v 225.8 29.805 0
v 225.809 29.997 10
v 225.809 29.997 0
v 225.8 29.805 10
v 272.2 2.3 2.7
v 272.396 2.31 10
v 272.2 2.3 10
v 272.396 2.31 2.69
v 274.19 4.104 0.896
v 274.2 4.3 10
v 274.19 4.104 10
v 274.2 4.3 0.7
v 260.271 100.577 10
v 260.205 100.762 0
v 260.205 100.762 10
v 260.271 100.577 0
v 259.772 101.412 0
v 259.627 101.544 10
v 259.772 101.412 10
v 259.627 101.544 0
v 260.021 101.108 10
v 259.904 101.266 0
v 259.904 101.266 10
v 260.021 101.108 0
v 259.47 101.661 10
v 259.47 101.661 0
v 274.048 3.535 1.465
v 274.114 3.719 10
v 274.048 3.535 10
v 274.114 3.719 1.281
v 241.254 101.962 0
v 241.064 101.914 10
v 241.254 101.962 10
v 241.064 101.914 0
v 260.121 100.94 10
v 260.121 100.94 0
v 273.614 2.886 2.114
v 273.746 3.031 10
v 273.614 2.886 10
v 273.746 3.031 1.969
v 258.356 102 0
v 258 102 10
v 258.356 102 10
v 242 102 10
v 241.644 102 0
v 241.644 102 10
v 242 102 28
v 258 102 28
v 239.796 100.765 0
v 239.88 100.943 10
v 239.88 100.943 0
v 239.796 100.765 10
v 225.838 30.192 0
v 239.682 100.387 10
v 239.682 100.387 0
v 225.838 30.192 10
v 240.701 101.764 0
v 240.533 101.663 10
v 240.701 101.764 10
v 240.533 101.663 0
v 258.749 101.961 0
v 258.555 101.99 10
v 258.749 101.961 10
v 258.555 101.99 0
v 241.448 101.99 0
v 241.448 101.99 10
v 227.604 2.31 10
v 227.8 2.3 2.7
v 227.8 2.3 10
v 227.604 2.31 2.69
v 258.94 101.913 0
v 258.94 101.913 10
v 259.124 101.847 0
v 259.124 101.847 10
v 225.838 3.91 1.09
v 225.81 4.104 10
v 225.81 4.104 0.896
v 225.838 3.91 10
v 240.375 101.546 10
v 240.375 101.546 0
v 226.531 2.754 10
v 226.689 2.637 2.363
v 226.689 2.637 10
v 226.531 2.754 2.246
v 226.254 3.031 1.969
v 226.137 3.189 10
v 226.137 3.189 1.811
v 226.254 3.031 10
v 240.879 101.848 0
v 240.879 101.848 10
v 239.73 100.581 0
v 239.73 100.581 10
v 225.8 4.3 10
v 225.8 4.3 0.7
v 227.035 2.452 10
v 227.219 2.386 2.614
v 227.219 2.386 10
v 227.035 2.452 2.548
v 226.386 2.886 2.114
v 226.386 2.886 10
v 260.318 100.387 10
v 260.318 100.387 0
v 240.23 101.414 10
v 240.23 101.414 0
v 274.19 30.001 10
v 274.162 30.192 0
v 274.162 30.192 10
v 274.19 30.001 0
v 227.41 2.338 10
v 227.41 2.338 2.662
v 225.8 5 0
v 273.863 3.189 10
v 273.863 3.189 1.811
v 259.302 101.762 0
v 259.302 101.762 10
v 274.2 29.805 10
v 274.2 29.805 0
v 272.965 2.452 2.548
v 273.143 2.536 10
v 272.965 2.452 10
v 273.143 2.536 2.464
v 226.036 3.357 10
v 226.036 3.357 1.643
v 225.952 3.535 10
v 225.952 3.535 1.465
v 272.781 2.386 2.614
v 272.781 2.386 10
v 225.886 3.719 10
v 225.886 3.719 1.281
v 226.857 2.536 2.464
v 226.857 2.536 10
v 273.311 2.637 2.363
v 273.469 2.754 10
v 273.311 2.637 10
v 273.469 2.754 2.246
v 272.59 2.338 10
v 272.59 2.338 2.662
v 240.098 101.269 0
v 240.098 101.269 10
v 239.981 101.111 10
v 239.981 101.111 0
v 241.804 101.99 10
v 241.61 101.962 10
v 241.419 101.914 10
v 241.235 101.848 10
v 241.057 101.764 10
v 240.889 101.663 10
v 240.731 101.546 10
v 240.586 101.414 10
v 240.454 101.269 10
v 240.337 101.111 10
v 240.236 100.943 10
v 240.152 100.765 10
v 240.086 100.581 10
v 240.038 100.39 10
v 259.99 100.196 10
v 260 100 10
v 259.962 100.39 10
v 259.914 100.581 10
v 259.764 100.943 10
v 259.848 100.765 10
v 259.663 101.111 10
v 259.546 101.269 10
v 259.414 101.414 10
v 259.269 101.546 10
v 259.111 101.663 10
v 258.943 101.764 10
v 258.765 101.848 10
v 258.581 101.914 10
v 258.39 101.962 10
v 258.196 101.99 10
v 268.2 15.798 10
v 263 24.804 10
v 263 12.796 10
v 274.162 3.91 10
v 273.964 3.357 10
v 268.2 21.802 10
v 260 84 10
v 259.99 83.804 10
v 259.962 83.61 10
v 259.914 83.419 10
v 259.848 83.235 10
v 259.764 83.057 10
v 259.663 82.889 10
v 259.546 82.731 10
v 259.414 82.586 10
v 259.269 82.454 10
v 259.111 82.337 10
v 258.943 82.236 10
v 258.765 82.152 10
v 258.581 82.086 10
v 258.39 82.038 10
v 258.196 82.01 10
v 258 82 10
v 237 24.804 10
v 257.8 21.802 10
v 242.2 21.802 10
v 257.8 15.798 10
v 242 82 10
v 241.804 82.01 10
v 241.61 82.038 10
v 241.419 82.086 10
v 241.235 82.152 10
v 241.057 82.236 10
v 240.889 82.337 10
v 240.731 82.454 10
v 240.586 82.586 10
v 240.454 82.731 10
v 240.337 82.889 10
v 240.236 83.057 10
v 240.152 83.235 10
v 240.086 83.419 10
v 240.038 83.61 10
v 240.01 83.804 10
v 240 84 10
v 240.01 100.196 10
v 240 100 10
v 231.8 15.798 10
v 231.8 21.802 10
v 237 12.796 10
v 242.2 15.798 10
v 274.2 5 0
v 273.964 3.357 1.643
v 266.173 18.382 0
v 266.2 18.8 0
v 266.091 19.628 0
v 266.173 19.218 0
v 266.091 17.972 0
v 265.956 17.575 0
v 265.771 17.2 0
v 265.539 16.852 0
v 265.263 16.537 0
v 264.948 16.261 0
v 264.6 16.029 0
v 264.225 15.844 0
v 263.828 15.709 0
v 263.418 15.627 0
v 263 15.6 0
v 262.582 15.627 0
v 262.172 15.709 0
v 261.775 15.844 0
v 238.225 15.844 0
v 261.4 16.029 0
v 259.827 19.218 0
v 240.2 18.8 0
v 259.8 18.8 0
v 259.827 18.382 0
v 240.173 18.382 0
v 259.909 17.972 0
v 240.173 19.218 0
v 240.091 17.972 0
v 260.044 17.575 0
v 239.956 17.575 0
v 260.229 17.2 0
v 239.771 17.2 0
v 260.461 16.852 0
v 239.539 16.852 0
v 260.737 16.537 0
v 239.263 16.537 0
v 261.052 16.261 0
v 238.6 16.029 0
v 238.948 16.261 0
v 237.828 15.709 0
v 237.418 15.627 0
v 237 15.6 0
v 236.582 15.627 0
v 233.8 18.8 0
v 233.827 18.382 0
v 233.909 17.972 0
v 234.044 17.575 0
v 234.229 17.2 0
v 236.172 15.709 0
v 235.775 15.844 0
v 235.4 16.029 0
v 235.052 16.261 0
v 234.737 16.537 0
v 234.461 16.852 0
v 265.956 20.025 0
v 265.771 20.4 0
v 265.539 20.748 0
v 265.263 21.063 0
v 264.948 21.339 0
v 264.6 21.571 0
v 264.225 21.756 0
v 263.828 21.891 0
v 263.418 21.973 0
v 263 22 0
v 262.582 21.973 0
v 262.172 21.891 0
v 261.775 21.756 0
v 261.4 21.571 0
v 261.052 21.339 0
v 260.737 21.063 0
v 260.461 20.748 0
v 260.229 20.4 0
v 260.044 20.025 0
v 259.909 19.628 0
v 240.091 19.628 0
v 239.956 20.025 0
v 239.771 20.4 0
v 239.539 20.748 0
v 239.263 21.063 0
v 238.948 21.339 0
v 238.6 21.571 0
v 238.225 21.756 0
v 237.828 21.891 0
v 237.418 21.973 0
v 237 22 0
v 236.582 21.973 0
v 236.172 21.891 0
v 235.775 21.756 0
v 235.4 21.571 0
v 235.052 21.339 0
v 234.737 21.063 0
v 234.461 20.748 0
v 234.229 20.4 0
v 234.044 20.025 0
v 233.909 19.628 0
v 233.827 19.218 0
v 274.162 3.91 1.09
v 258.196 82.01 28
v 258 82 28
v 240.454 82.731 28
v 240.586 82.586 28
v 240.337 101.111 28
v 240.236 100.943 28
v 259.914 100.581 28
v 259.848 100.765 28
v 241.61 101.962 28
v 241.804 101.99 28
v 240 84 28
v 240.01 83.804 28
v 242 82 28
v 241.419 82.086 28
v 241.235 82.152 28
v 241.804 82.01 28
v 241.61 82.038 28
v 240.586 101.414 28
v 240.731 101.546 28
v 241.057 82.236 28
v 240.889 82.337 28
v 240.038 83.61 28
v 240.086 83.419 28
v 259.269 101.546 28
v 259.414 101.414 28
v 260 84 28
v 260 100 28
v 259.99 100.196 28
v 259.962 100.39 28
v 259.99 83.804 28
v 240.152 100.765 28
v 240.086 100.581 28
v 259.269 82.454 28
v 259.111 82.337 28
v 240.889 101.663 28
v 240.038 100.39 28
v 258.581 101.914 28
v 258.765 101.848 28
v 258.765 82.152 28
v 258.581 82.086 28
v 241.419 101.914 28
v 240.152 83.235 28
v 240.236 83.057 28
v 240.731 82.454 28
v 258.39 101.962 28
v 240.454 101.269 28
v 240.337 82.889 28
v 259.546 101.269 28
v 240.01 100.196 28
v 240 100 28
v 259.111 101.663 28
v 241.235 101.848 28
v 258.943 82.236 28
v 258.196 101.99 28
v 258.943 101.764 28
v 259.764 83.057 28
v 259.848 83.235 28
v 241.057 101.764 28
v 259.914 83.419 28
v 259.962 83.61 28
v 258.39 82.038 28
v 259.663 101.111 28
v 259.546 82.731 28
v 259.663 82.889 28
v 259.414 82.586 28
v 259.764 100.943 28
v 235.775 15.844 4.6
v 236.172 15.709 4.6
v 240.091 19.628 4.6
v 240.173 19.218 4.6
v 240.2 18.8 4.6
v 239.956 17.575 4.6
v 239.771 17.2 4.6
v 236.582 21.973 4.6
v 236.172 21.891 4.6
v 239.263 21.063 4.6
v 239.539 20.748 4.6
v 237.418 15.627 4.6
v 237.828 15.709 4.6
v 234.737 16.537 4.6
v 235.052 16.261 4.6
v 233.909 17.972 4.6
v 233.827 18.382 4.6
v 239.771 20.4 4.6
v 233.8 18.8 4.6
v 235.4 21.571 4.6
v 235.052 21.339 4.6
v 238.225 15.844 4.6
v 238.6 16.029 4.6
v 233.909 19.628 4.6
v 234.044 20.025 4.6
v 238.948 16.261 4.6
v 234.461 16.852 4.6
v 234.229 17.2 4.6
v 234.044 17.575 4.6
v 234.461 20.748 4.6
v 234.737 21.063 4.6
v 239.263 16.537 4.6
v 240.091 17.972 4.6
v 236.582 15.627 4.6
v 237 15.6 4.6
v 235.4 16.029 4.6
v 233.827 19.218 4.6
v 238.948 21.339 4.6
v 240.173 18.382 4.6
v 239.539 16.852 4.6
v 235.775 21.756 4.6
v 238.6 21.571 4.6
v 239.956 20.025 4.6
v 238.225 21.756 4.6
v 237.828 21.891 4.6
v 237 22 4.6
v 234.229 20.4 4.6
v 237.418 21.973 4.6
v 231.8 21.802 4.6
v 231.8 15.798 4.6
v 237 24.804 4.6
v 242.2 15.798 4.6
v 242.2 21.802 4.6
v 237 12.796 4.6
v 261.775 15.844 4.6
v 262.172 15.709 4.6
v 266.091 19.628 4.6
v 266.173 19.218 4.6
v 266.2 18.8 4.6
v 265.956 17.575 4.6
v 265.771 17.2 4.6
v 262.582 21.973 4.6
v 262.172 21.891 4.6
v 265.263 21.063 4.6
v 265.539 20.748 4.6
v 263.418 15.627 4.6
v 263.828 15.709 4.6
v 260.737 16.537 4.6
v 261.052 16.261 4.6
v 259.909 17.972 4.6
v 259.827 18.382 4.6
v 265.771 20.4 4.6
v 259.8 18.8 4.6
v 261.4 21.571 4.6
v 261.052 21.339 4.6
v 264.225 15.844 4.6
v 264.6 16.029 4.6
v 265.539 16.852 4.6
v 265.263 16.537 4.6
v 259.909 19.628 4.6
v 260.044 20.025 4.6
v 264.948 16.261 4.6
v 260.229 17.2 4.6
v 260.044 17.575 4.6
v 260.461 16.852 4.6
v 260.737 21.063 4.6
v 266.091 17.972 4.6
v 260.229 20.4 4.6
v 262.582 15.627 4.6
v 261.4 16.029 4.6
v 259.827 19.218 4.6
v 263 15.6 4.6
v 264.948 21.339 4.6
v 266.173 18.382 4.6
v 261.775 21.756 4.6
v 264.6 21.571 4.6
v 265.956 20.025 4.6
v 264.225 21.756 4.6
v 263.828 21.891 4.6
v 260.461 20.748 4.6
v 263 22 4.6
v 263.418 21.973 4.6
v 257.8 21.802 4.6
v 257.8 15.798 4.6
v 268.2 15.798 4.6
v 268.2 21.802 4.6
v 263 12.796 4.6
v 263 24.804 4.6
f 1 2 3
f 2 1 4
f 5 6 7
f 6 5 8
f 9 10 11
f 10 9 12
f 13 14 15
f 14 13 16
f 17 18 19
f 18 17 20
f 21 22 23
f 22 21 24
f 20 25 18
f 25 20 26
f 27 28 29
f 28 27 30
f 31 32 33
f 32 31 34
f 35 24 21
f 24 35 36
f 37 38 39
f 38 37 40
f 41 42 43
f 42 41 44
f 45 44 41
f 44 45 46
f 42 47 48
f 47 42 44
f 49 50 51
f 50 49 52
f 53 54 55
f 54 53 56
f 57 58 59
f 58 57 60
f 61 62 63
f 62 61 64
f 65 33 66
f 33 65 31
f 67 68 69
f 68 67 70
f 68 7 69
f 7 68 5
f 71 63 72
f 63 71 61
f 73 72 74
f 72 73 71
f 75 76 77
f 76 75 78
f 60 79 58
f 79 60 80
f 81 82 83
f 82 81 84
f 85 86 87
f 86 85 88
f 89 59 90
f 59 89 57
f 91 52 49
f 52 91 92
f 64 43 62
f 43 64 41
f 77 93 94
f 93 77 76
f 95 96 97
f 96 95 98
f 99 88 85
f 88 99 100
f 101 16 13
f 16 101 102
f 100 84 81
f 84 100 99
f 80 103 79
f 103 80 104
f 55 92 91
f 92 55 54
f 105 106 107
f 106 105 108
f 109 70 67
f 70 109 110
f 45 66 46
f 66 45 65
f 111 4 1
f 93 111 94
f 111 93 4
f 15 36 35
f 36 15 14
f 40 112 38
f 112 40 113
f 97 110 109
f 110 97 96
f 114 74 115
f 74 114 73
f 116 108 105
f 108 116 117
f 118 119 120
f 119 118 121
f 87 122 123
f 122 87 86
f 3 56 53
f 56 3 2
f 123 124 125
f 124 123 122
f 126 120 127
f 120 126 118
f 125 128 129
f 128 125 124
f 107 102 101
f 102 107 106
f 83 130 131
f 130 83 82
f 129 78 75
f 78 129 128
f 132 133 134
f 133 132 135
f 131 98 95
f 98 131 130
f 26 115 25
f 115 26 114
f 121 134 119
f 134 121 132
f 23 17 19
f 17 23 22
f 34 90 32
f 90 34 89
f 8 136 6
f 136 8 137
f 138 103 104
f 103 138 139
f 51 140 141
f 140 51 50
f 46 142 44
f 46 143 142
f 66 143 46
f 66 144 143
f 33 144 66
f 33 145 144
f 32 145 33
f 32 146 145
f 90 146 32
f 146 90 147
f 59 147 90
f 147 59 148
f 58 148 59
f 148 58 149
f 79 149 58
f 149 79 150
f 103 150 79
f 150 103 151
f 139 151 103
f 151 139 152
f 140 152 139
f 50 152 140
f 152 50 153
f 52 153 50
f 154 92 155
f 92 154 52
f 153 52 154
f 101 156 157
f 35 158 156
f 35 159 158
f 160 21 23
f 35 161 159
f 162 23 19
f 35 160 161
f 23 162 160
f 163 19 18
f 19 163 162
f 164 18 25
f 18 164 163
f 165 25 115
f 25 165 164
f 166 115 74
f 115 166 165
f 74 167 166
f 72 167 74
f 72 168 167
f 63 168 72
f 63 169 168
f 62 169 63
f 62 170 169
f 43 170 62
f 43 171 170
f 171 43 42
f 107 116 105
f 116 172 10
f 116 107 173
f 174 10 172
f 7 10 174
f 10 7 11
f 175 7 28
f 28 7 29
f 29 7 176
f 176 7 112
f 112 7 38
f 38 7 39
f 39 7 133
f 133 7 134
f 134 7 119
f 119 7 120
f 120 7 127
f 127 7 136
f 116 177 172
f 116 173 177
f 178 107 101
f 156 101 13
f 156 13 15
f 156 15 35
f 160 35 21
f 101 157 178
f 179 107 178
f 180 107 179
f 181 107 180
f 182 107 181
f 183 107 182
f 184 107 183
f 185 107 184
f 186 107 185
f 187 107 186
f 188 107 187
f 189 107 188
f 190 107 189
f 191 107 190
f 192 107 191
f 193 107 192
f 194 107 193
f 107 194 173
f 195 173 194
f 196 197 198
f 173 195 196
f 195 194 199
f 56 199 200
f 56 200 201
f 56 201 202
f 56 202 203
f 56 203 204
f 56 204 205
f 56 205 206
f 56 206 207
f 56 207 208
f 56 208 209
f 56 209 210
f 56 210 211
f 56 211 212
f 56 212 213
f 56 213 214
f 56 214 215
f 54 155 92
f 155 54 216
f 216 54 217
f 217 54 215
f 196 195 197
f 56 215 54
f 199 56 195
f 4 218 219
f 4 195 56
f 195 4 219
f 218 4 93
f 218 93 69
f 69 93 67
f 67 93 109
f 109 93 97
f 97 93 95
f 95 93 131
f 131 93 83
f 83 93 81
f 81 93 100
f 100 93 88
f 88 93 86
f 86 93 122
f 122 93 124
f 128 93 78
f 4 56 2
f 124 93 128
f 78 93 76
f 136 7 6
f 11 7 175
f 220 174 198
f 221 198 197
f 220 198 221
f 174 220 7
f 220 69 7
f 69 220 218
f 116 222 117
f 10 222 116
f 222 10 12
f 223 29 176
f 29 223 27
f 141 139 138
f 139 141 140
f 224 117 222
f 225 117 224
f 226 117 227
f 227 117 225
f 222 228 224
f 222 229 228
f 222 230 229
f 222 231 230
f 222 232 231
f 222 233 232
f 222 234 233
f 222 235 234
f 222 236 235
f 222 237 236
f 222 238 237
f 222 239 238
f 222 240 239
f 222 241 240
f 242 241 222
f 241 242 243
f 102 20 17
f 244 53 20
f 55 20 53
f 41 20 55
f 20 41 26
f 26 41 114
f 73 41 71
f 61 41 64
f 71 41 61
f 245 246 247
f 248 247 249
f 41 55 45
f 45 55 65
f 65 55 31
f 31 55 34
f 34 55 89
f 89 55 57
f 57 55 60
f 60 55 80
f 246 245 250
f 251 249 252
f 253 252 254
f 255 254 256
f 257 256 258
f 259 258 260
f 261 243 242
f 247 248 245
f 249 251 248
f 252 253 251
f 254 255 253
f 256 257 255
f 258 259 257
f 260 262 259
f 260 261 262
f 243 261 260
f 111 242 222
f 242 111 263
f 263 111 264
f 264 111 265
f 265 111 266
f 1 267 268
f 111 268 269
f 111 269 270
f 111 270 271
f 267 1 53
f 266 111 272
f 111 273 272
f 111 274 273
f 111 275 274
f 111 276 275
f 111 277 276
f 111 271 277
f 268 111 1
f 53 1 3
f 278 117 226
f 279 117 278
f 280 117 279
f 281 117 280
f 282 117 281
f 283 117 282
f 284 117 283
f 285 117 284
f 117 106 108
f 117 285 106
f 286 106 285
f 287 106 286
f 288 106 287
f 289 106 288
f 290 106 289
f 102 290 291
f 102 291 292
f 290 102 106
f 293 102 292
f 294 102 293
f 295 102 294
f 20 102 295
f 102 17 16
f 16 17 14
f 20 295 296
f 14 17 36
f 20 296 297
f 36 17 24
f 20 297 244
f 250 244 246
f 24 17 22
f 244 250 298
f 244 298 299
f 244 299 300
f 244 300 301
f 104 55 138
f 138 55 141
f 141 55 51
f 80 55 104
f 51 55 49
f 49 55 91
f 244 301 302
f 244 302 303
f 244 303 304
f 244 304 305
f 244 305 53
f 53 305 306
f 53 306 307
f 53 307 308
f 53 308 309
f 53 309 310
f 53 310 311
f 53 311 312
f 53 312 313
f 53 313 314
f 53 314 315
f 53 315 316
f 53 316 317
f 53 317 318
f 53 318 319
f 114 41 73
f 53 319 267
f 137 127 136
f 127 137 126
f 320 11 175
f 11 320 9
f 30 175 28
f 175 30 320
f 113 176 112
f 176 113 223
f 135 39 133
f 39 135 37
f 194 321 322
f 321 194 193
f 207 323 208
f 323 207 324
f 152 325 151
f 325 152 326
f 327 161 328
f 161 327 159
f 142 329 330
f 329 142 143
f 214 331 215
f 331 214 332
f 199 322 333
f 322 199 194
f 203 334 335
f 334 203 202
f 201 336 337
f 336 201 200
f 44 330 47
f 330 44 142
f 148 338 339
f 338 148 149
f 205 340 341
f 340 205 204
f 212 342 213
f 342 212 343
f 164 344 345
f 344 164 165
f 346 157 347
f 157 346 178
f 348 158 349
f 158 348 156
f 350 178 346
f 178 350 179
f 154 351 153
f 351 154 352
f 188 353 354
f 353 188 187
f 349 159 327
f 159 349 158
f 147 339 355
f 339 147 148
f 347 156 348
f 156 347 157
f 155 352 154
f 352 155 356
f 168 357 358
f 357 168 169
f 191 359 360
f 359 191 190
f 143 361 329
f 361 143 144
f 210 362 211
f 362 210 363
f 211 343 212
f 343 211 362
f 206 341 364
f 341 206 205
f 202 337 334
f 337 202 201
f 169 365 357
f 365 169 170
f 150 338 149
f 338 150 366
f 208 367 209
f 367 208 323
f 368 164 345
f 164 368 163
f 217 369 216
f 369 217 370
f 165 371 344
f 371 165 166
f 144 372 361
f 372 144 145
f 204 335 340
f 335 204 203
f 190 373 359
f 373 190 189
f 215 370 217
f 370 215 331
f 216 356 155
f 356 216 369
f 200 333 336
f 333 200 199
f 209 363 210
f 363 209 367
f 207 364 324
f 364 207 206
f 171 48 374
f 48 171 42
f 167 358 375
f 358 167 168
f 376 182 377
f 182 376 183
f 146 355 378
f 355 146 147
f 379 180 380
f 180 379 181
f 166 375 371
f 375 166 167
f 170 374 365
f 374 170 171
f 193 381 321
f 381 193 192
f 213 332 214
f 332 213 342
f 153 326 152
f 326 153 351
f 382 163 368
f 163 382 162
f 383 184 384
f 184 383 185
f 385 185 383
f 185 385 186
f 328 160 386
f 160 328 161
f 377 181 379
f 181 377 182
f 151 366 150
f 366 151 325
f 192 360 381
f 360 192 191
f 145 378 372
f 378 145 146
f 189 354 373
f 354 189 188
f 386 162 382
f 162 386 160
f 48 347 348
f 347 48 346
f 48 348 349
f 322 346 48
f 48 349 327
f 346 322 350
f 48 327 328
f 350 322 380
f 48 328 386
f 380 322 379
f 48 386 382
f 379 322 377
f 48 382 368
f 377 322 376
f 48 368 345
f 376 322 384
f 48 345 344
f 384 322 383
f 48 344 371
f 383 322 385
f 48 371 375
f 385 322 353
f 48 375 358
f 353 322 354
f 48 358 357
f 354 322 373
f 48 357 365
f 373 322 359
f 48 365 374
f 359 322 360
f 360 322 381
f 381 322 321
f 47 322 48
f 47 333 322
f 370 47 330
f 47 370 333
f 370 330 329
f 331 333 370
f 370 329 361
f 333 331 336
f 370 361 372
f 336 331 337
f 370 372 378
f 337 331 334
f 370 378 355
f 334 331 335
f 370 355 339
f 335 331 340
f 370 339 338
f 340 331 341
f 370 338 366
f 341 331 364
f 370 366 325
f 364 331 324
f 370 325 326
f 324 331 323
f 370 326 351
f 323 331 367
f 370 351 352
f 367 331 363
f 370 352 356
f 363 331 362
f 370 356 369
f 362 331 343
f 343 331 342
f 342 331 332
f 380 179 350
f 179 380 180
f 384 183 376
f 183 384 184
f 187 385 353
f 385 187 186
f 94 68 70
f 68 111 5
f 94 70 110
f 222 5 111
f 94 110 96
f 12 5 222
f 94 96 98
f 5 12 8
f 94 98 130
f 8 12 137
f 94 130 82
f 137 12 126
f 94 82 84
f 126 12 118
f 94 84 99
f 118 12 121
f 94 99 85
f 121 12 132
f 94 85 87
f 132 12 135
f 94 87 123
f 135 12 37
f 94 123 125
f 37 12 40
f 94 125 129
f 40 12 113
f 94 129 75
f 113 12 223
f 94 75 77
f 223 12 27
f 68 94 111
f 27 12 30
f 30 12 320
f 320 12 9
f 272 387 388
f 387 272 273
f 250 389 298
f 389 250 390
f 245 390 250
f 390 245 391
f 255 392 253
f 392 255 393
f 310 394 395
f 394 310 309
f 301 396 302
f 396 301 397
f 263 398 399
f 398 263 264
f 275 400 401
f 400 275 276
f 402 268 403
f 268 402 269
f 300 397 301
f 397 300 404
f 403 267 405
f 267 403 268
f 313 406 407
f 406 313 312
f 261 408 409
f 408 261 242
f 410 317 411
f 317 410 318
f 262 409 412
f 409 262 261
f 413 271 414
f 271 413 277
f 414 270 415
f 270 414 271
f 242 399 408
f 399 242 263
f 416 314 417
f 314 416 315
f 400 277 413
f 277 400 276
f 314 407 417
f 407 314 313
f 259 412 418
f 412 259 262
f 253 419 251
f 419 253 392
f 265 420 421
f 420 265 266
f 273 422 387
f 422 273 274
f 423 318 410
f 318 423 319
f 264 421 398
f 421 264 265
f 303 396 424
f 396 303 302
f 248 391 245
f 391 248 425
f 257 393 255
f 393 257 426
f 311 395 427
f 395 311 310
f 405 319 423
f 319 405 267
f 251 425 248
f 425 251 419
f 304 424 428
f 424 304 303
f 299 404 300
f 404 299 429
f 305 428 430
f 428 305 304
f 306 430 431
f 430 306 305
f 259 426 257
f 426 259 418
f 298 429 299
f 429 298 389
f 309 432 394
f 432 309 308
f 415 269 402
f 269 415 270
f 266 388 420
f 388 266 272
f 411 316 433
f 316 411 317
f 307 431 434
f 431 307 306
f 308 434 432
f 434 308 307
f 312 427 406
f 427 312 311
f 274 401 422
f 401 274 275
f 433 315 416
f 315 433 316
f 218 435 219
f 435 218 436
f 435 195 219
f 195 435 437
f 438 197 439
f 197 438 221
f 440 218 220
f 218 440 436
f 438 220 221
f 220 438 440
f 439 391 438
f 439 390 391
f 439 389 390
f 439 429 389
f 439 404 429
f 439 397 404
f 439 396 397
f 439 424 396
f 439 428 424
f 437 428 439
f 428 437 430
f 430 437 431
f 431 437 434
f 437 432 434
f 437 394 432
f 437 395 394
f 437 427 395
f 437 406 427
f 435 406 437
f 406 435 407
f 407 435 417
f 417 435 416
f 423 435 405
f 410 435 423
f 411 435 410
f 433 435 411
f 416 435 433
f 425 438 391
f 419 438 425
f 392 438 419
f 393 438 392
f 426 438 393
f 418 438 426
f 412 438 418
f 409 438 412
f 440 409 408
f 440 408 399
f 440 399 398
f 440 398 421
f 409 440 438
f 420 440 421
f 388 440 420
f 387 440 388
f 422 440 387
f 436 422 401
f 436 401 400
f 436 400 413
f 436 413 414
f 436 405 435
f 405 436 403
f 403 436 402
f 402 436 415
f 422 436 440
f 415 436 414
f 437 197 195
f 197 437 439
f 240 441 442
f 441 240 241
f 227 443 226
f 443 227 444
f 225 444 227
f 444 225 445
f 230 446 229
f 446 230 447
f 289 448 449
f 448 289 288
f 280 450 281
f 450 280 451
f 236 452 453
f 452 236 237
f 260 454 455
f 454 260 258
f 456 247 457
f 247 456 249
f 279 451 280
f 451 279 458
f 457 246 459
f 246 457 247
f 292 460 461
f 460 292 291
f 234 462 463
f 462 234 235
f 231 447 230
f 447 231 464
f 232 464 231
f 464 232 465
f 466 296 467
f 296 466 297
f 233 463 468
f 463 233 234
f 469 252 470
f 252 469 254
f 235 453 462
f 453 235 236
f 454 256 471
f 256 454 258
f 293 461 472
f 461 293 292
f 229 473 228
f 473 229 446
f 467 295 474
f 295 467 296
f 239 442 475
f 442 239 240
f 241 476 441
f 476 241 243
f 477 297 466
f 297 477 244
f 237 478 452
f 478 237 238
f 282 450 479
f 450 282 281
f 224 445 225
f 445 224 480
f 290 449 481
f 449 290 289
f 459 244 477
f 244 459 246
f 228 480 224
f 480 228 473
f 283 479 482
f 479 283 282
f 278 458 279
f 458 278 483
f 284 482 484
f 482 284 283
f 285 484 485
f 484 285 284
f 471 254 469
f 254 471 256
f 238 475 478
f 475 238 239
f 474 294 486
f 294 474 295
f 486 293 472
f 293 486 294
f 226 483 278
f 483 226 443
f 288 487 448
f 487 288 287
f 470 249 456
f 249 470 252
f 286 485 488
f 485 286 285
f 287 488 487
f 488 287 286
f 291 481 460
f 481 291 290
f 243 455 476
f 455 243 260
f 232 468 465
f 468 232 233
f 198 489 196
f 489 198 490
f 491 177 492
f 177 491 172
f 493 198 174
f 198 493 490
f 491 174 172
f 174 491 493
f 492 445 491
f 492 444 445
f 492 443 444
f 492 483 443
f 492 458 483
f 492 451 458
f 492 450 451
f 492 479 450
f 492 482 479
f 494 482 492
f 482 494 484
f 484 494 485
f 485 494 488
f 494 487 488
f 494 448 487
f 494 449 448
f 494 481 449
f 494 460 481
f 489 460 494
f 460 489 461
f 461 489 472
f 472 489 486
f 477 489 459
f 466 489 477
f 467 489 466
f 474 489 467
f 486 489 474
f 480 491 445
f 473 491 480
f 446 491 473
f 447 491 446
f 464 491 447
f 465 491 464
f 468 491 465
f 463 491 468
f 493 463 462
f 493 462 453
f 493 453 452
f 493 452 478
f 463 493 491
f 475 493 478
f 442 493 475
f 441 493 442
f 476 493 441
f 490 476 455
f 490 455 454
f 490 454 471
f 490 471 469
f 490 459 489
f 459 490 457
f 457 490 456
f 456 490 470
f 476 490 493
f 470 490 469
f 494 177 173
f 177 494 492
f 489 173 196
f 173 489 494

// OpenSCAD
// file: ../../../modules/steel_rack.scad
use <bolts.scad>;

bolt_edge_offset = 15;
bolt_positions = [
  bolt_edge_offset,
  bolt_edge_offset + 98,
  bolt_edge_offset + 98 + 24,
];

module bolt_and_nut(y, h) {
  nut_thickness = 5;
  translate([0, y, h / 2])
    m6_bolt_hole(h + 1, center = true);
  translate([0, y, h - nut_thickness / 2])
    rotate([0, 0, 90])
    m6_nut_trap(nut_thickness, center = true);
}

module long_bar(w, y, h) {
  difference() {
    translate([w / 2, y / 2, h / 2])
      cube([w, y, h], center = true);

    for (x = bolt_positions) {
      translate([x, 0, 0])
        bolt_and_nut(y / 2, h);
    }
  }
}

module short_bar(w, y, h) {
  difference() {
    translate([w / 2, y / 2, h / 2])
      cube([w, y, h], center = true);

    translate([bolt_positions[0], 0, 0])
      bolt_and_nut(y / 2, h);
  }
}

module fillet_profile(r, h) {
  linear_extrude(height = h, center = true)
    difference() {
      square([r, r]);
      circle(r = r, $fn = 64);
    }
}
// file: ../../../modules/slide_rail_outer_bracket.scad
use <bolts.scad>
use <steel_rack.scad>

// スライドレール外側とL字アングルを接合するL字ブラケット。
// 設計の経緯と確定値は ledger/designs/steel-rack-500x400.md が正本。
//
// 座標系 (部品自身の datum):
//   X = 0 がこの部品側のL字アングル外側面。部品はアングル板厚の内側から始まる
//   Y = 0 がスライドレール外側面。+Y がラック外側
//   Z = 0 が部品底面 (レール下端と一致)
// front は screw_x = [37, 101.5]、rear は [79.5, 176] を自分の datum
// から渡す。 M6 が高さ 22.5±12 の対称配置のため部品は Z 反転対称になり、
// 左右のレールにも上下反転するだけで同じ2部品を使い回せる。

bracket_height = 45;
flange_t = 10; // 短辺 (X方向厚) の厚さ
// 長辺 (Y方向厚) の厚さ。旧断面は flange_t=10 を共用していたが、レール面を
// rail_offset 分外へ出すと M6 ナット挿入口が長辺と重なるため 2mm 削った
// (10→8、user決定)。ナット六角の内縁 (y=8.000) と長辺外面がツライチになる
arm_t = 8;
// レール接触面のラック外側オフセット。組付け実測でレール間隔が 385mm しか
// なくケース 412mm が入らないため、(412 - 385) / 2 + 0.5 = 14mm ずつ
// 各レールを外側へ移す (user指示)。M6 実穴は既に開いており位置を変えられない
rail_offset = 14;
inner_r = 4;
m6_z = [ 10.5, 34.5 ];
// クリアランス基準: 呼び寸法 + 0.4mm (実プリントの嵌合結果から拡大)
m6_pass_flat = 6.4; // M6ボルト通し六角の二面幅 (手前5mm)
m6_nut_flat = 10.4; // M6ナット窪み六角の二面幅 (奥5mm、ナット実測9.8 + 実効0.6)
m6_stage_depth = 5;
screw_z = 22.5;
m4_pass_flat = 4.4; // M4小トラスネジ通し六角の二面幅
m4_nut_flat = 7.4; // M4ナット窪み六角の二面幅 (ナット実測6.8 + 実効0.6)
m4_nut_depth = 2.8; // M4ナット窪みの深さ (user指定)
edge_margin = 8; // 穴の外縁から部品端までの余白 (自由な辺のみ)
angle_t = 2.2; // L字アングルの板厚

// 六角プリズム: 軸X・上下の辺が水平 (flat-up)。
// 天井を短い水平ブリッジにして垂れの改善を狙う
// (point-up だと天井面が水平から30°になり垂れた — 嵌合試験で確認済み)
module
hex_x_flat_up(flat_d, l)
{
    rotate([ 0, 90, 0 ]) rotate([ 0, 0, 90 ]) hex_hole(flat_d = flat_d, h = l);
}

// 六角プリズム: 軸Y・上下の辺が水平 (flat-up)。M6と同じくブリッジ天井
module
hex_y_flat_up(flat_d, l)
{
    rotate([ 90, 0, 0 ]) hex_hole(flat_d = flat_d, h = l);
}

module
slide_rail_outer_bracket(screw_x, name = "bracket")
{
    // flat-up配置では水平方向の穴半径は対角/2 (= 二面幅/(2*cos30))。
    // 8mm余白の契約はこの実半径に対して守る
    m6_nut_diag = m6_nut_flat / cos(30);
    m4_nut_diag = m4_nut_flat / cos(30);
    // M6中心: 実物のアングルには旧断面 (長辺厚10) の導出値
    // (厚10 + 内側R + 余白 + M6六角対角/2 = 28.0044) で既に穴が開いている。
    // 旧導出式から rail_offset を引くことで M6 実穴と部品外端の絶対位置を
    // 保ったまま、レール接触面 (y=0) だけをラック外側へ 14mm 出す
    m6_y = flange_t + inner_r + edge_margin + m6_nut_diag / 2 - rail_offset;
    short_len = m6_y + m6_nut_diag / 2 + edge_margin;
    // 長辺のX終端: 最奥のM4穴の最大断面 (ナット窪みの対角の半分) + 余白
    arm_end = max(screw_x) + m4_nut_diag / 2 + edge_margin;

    echo(str("CONTRACT ", name, ": height = ", bracket_height));
    echo(str("CONTRACT ", name, ": flange_t = ", flange_t));
    echo(str("CONTRACT ", name, ": arm_t = ", arm_t));
    echo(str("CONTRACT ", name, ": rail_offset = ", rail_offset));
    echo(str("CONTRACT ", name, ": inner_r = ", inner_r));
    echo(str("CONTRACT ", name, ": m6_z = ", m6_z));
    echo(str("CONTRACT ", name, ": m6_pass_flat = ", m6_pass_flat));
    echo(str("CONTRACT ", name, ": m6_nut_flat = ", m6_nut_flat));
    echo(str("CONTRACT ", name, ": screw_z = ", screw_z));
    echo(str("CONTRACT ", name, ": m4_pass_flat = ", m4_pass_flat));
    echo(str("CONTRACT ", name, ": m4_nut_flat = ", m4_nut_flat));
    echo(str("CONTRACT ", name, ": m4_nut_depth = ", m4_nut_depth));
    echo(str("CONTRACT ", name, ": edge_margin = ", edge_margin));
    echo(str("CONTRACT ", name, ": angle_t = ", angle_t));
    echo(str("CONTRACT ", name, ": screw_x = ", screw_x));
    echo(str("CONTRACT ",
             name,
             ": m6_y = ",
             m6_y,
             ", short_len = ",
             short_len,
             ", arm_end = ",
             arm_end));

    // 余白の契約 (自由な辺のみ。高さ45とM6のZはuser固定値なので対象外)。
    // M6ナット六角の内縁 (m6_y - 対角/2 = 8.000) は長辺外面 (y = arm_t) と
    // ツライチで、ナット挿入口が長辺に塞がれない (1e-9 は浮動小数の丸め猶予)
    assert(m6_y - m6_nut_diag / 2 >= arm_t - 1e-9,
           "M6 nut slot is blocked by the arm");
    assert(short_len - (m6_y + m6_nut_diag / 2) >= edge_margin,
           "M6 hole too close to the short-flange edge");
    assert(arm_end - (max(screw_x) + m4_nut_diag / 2) >= edge_margin,
           "M4 hole too close to the arm end");
    assert(min(screw_x) - m4_nut_diag / 2 >= angle_t + flange_t,
           "M4 hole overlaps the short flange");

    difference()
    {
        union()
        {
            // 短辺: アングル内側に当たる縦板 (M6で締結)
            translate([ angle_t, 0, 0 ])
                cube([ flange_t, short_len, bracket_height ]);

            // 長辺: レール外側面に当たる横板 (M4小トラスネジ+ナットで締結)
            translate([ angle_t, 0, 0 ])
                cube([ arm_end - angle_t, arm_t, bracket_height ]);

            // 内側コーナーのR4フィレット (応力集中の回避)
            translate([
                angle_t + flange_t + inner_r,
                arm_t + inner_r,
                bracket_height / 2
            ]) rotate([ 0, 0, 180 ]) fillet_profile(inner_r, bracket_height);
        }

        // M6の2段六角穴 (軸X・flat-up): 手前5mmが通し、奥5mmがナット窪み。
        // ナット窪みは +X へ延長した挿入回廊 (x=7.2..17): 短辺の背面から
        // fillet の掛かる区間を局所カットし、fillet 外端 (x=16.2) を 0.8mm
        // 超えて開放することで M6 ナットを +X 側から真っ直ぐ挿入できる
        // (fillet と挿入経路の干渉分を削るのは user 許容)。
        // 六角の下頂点 (y=8.000) は長辺外面とツライチで、正確な接触は
        // 退化した稜 (非多様体STL) を作るため、hull で 0.2mm 下へ掃引して
        // 長辺外面に浅い逃げ溝を彫る (ナットの嵌合には影響しない)
        slot_start = angle_t + flange_t - m6_stage_depth;
        slot_end = angle_t + flange_t + inner_r + 0.8;
        slot_relief = 0.2;
        for (z = m6_z) {
            translate([ angle_t + m6_stage_depth / 2 - 0.05, m6_y, z ])
                hex_x_flat_up(m6_pass_flat, m6_stage_depth + 0.1);
            translate([ (slot_start + slot_end) / 2, m6_y, z ]) hull()
            {
                hex_x_flat_up(m6_nut_flat, slot_end - slot_start);
                translate([ 0, -slot_relief, 0 ])
                    hex_x_flat_up(m6_nut_flat, slot_end - slot_start);
            }
        }

        // M4小トラスネジの穴 (軸Y・flat-up):
        // 通しは全厚を貫通し、L字の内側面 (y=8) から深さ2.8mmのナット窪み。
        // ネジはレール内側から刺さり
        // (トラス頭はスライダーと干渉しない実測済み)、
        // ナットが窪みの底で受けてレール板とブラケットを共締めする
        for (x = screw_x) {
            translate([ x, arm_t / 2, screw_z ])
                hex_y_flat_up(m4_pass_flat, arm_t + 0.2);
            translate([ x, arm_t - m4_nut_depth / 2 + 0.05, screw_z ])
                hex_y_flat_up(m4_nut_flat, m4_nut_depth + 0.1);
        }
    }
}
// file: ../../../modules/bolts.scad
module nut_trap(d, h, center = true) {
  linear_extrude(height = h, center = center)
  circle(d = d / cos(30), $fn = 6);
}

module bolt_hole(d, h, center = true) {
  linear_extrude(height = h, center = center)
  circle(d = d, $fn = 64);
}

// Hex holes for self-tapping (nominal - 0.2mm)
module hex_hole(flat_d, h) {
  linear_extrude(height = h, center = true)
  circle(d = flat_d / cos(30), $fn = 6);
}

module m3_bolt_hexhole(h) {
  rotate([0, 0, 90]) hex_hole(flat_d = 2.8, h = h);
}

module m4_bolt_hexhole(h) {
  rotate([0, 0, 90]) hex_hole(flat_d = 3.8, h = h);
}

module m6_bolt_hexhole(h) {
  rotate([0, 0, 90]) hex_hole(flat_d = 5.8, h = h);
}

module m8_bolt_hexhole(h) {
  rotate([0, 0, 90]) hex_hole(flat_d = 7.8, h = h);
}

// M3
module m3_bolt_hole(h, center = false) { bolt_hole(d = 3.4, h = h, center = center); }
module m3_nut_trap(h, center = false) { nut_trap(d = 5.7, h = h, center = center); }

// M4
module m4_bolt_hole(h, center = false) { bolt_hole(d = 4.4, h = h, center = center); }
module m4_nut_trap(h, center = false) { nut_trap(d = 7.5, h = h, center = center); }

// M6
module m6_bolt_hole(h, center = false) { bolt_hole(d = 6.2, h = h, center = center); }
module m6_nut_trap(h, center = false) { nut_trap(d = 10.2, h = h, center = center); }

// M8
module m8_bolt_hole(h, center = false) { bolt_hole(d = 8.4, h = h, center = center); }
module m8_nut_trap(h, center = false) { nut_trap(d = 13.3, h = h, center = center); }
// main file
use <../../../modules/shelf_frame.scad>

// ケース棚の辺の支え。手前・奥の30cm材の中央用。
shelf_frame_flat_print() shelf_frame_mid_front();
